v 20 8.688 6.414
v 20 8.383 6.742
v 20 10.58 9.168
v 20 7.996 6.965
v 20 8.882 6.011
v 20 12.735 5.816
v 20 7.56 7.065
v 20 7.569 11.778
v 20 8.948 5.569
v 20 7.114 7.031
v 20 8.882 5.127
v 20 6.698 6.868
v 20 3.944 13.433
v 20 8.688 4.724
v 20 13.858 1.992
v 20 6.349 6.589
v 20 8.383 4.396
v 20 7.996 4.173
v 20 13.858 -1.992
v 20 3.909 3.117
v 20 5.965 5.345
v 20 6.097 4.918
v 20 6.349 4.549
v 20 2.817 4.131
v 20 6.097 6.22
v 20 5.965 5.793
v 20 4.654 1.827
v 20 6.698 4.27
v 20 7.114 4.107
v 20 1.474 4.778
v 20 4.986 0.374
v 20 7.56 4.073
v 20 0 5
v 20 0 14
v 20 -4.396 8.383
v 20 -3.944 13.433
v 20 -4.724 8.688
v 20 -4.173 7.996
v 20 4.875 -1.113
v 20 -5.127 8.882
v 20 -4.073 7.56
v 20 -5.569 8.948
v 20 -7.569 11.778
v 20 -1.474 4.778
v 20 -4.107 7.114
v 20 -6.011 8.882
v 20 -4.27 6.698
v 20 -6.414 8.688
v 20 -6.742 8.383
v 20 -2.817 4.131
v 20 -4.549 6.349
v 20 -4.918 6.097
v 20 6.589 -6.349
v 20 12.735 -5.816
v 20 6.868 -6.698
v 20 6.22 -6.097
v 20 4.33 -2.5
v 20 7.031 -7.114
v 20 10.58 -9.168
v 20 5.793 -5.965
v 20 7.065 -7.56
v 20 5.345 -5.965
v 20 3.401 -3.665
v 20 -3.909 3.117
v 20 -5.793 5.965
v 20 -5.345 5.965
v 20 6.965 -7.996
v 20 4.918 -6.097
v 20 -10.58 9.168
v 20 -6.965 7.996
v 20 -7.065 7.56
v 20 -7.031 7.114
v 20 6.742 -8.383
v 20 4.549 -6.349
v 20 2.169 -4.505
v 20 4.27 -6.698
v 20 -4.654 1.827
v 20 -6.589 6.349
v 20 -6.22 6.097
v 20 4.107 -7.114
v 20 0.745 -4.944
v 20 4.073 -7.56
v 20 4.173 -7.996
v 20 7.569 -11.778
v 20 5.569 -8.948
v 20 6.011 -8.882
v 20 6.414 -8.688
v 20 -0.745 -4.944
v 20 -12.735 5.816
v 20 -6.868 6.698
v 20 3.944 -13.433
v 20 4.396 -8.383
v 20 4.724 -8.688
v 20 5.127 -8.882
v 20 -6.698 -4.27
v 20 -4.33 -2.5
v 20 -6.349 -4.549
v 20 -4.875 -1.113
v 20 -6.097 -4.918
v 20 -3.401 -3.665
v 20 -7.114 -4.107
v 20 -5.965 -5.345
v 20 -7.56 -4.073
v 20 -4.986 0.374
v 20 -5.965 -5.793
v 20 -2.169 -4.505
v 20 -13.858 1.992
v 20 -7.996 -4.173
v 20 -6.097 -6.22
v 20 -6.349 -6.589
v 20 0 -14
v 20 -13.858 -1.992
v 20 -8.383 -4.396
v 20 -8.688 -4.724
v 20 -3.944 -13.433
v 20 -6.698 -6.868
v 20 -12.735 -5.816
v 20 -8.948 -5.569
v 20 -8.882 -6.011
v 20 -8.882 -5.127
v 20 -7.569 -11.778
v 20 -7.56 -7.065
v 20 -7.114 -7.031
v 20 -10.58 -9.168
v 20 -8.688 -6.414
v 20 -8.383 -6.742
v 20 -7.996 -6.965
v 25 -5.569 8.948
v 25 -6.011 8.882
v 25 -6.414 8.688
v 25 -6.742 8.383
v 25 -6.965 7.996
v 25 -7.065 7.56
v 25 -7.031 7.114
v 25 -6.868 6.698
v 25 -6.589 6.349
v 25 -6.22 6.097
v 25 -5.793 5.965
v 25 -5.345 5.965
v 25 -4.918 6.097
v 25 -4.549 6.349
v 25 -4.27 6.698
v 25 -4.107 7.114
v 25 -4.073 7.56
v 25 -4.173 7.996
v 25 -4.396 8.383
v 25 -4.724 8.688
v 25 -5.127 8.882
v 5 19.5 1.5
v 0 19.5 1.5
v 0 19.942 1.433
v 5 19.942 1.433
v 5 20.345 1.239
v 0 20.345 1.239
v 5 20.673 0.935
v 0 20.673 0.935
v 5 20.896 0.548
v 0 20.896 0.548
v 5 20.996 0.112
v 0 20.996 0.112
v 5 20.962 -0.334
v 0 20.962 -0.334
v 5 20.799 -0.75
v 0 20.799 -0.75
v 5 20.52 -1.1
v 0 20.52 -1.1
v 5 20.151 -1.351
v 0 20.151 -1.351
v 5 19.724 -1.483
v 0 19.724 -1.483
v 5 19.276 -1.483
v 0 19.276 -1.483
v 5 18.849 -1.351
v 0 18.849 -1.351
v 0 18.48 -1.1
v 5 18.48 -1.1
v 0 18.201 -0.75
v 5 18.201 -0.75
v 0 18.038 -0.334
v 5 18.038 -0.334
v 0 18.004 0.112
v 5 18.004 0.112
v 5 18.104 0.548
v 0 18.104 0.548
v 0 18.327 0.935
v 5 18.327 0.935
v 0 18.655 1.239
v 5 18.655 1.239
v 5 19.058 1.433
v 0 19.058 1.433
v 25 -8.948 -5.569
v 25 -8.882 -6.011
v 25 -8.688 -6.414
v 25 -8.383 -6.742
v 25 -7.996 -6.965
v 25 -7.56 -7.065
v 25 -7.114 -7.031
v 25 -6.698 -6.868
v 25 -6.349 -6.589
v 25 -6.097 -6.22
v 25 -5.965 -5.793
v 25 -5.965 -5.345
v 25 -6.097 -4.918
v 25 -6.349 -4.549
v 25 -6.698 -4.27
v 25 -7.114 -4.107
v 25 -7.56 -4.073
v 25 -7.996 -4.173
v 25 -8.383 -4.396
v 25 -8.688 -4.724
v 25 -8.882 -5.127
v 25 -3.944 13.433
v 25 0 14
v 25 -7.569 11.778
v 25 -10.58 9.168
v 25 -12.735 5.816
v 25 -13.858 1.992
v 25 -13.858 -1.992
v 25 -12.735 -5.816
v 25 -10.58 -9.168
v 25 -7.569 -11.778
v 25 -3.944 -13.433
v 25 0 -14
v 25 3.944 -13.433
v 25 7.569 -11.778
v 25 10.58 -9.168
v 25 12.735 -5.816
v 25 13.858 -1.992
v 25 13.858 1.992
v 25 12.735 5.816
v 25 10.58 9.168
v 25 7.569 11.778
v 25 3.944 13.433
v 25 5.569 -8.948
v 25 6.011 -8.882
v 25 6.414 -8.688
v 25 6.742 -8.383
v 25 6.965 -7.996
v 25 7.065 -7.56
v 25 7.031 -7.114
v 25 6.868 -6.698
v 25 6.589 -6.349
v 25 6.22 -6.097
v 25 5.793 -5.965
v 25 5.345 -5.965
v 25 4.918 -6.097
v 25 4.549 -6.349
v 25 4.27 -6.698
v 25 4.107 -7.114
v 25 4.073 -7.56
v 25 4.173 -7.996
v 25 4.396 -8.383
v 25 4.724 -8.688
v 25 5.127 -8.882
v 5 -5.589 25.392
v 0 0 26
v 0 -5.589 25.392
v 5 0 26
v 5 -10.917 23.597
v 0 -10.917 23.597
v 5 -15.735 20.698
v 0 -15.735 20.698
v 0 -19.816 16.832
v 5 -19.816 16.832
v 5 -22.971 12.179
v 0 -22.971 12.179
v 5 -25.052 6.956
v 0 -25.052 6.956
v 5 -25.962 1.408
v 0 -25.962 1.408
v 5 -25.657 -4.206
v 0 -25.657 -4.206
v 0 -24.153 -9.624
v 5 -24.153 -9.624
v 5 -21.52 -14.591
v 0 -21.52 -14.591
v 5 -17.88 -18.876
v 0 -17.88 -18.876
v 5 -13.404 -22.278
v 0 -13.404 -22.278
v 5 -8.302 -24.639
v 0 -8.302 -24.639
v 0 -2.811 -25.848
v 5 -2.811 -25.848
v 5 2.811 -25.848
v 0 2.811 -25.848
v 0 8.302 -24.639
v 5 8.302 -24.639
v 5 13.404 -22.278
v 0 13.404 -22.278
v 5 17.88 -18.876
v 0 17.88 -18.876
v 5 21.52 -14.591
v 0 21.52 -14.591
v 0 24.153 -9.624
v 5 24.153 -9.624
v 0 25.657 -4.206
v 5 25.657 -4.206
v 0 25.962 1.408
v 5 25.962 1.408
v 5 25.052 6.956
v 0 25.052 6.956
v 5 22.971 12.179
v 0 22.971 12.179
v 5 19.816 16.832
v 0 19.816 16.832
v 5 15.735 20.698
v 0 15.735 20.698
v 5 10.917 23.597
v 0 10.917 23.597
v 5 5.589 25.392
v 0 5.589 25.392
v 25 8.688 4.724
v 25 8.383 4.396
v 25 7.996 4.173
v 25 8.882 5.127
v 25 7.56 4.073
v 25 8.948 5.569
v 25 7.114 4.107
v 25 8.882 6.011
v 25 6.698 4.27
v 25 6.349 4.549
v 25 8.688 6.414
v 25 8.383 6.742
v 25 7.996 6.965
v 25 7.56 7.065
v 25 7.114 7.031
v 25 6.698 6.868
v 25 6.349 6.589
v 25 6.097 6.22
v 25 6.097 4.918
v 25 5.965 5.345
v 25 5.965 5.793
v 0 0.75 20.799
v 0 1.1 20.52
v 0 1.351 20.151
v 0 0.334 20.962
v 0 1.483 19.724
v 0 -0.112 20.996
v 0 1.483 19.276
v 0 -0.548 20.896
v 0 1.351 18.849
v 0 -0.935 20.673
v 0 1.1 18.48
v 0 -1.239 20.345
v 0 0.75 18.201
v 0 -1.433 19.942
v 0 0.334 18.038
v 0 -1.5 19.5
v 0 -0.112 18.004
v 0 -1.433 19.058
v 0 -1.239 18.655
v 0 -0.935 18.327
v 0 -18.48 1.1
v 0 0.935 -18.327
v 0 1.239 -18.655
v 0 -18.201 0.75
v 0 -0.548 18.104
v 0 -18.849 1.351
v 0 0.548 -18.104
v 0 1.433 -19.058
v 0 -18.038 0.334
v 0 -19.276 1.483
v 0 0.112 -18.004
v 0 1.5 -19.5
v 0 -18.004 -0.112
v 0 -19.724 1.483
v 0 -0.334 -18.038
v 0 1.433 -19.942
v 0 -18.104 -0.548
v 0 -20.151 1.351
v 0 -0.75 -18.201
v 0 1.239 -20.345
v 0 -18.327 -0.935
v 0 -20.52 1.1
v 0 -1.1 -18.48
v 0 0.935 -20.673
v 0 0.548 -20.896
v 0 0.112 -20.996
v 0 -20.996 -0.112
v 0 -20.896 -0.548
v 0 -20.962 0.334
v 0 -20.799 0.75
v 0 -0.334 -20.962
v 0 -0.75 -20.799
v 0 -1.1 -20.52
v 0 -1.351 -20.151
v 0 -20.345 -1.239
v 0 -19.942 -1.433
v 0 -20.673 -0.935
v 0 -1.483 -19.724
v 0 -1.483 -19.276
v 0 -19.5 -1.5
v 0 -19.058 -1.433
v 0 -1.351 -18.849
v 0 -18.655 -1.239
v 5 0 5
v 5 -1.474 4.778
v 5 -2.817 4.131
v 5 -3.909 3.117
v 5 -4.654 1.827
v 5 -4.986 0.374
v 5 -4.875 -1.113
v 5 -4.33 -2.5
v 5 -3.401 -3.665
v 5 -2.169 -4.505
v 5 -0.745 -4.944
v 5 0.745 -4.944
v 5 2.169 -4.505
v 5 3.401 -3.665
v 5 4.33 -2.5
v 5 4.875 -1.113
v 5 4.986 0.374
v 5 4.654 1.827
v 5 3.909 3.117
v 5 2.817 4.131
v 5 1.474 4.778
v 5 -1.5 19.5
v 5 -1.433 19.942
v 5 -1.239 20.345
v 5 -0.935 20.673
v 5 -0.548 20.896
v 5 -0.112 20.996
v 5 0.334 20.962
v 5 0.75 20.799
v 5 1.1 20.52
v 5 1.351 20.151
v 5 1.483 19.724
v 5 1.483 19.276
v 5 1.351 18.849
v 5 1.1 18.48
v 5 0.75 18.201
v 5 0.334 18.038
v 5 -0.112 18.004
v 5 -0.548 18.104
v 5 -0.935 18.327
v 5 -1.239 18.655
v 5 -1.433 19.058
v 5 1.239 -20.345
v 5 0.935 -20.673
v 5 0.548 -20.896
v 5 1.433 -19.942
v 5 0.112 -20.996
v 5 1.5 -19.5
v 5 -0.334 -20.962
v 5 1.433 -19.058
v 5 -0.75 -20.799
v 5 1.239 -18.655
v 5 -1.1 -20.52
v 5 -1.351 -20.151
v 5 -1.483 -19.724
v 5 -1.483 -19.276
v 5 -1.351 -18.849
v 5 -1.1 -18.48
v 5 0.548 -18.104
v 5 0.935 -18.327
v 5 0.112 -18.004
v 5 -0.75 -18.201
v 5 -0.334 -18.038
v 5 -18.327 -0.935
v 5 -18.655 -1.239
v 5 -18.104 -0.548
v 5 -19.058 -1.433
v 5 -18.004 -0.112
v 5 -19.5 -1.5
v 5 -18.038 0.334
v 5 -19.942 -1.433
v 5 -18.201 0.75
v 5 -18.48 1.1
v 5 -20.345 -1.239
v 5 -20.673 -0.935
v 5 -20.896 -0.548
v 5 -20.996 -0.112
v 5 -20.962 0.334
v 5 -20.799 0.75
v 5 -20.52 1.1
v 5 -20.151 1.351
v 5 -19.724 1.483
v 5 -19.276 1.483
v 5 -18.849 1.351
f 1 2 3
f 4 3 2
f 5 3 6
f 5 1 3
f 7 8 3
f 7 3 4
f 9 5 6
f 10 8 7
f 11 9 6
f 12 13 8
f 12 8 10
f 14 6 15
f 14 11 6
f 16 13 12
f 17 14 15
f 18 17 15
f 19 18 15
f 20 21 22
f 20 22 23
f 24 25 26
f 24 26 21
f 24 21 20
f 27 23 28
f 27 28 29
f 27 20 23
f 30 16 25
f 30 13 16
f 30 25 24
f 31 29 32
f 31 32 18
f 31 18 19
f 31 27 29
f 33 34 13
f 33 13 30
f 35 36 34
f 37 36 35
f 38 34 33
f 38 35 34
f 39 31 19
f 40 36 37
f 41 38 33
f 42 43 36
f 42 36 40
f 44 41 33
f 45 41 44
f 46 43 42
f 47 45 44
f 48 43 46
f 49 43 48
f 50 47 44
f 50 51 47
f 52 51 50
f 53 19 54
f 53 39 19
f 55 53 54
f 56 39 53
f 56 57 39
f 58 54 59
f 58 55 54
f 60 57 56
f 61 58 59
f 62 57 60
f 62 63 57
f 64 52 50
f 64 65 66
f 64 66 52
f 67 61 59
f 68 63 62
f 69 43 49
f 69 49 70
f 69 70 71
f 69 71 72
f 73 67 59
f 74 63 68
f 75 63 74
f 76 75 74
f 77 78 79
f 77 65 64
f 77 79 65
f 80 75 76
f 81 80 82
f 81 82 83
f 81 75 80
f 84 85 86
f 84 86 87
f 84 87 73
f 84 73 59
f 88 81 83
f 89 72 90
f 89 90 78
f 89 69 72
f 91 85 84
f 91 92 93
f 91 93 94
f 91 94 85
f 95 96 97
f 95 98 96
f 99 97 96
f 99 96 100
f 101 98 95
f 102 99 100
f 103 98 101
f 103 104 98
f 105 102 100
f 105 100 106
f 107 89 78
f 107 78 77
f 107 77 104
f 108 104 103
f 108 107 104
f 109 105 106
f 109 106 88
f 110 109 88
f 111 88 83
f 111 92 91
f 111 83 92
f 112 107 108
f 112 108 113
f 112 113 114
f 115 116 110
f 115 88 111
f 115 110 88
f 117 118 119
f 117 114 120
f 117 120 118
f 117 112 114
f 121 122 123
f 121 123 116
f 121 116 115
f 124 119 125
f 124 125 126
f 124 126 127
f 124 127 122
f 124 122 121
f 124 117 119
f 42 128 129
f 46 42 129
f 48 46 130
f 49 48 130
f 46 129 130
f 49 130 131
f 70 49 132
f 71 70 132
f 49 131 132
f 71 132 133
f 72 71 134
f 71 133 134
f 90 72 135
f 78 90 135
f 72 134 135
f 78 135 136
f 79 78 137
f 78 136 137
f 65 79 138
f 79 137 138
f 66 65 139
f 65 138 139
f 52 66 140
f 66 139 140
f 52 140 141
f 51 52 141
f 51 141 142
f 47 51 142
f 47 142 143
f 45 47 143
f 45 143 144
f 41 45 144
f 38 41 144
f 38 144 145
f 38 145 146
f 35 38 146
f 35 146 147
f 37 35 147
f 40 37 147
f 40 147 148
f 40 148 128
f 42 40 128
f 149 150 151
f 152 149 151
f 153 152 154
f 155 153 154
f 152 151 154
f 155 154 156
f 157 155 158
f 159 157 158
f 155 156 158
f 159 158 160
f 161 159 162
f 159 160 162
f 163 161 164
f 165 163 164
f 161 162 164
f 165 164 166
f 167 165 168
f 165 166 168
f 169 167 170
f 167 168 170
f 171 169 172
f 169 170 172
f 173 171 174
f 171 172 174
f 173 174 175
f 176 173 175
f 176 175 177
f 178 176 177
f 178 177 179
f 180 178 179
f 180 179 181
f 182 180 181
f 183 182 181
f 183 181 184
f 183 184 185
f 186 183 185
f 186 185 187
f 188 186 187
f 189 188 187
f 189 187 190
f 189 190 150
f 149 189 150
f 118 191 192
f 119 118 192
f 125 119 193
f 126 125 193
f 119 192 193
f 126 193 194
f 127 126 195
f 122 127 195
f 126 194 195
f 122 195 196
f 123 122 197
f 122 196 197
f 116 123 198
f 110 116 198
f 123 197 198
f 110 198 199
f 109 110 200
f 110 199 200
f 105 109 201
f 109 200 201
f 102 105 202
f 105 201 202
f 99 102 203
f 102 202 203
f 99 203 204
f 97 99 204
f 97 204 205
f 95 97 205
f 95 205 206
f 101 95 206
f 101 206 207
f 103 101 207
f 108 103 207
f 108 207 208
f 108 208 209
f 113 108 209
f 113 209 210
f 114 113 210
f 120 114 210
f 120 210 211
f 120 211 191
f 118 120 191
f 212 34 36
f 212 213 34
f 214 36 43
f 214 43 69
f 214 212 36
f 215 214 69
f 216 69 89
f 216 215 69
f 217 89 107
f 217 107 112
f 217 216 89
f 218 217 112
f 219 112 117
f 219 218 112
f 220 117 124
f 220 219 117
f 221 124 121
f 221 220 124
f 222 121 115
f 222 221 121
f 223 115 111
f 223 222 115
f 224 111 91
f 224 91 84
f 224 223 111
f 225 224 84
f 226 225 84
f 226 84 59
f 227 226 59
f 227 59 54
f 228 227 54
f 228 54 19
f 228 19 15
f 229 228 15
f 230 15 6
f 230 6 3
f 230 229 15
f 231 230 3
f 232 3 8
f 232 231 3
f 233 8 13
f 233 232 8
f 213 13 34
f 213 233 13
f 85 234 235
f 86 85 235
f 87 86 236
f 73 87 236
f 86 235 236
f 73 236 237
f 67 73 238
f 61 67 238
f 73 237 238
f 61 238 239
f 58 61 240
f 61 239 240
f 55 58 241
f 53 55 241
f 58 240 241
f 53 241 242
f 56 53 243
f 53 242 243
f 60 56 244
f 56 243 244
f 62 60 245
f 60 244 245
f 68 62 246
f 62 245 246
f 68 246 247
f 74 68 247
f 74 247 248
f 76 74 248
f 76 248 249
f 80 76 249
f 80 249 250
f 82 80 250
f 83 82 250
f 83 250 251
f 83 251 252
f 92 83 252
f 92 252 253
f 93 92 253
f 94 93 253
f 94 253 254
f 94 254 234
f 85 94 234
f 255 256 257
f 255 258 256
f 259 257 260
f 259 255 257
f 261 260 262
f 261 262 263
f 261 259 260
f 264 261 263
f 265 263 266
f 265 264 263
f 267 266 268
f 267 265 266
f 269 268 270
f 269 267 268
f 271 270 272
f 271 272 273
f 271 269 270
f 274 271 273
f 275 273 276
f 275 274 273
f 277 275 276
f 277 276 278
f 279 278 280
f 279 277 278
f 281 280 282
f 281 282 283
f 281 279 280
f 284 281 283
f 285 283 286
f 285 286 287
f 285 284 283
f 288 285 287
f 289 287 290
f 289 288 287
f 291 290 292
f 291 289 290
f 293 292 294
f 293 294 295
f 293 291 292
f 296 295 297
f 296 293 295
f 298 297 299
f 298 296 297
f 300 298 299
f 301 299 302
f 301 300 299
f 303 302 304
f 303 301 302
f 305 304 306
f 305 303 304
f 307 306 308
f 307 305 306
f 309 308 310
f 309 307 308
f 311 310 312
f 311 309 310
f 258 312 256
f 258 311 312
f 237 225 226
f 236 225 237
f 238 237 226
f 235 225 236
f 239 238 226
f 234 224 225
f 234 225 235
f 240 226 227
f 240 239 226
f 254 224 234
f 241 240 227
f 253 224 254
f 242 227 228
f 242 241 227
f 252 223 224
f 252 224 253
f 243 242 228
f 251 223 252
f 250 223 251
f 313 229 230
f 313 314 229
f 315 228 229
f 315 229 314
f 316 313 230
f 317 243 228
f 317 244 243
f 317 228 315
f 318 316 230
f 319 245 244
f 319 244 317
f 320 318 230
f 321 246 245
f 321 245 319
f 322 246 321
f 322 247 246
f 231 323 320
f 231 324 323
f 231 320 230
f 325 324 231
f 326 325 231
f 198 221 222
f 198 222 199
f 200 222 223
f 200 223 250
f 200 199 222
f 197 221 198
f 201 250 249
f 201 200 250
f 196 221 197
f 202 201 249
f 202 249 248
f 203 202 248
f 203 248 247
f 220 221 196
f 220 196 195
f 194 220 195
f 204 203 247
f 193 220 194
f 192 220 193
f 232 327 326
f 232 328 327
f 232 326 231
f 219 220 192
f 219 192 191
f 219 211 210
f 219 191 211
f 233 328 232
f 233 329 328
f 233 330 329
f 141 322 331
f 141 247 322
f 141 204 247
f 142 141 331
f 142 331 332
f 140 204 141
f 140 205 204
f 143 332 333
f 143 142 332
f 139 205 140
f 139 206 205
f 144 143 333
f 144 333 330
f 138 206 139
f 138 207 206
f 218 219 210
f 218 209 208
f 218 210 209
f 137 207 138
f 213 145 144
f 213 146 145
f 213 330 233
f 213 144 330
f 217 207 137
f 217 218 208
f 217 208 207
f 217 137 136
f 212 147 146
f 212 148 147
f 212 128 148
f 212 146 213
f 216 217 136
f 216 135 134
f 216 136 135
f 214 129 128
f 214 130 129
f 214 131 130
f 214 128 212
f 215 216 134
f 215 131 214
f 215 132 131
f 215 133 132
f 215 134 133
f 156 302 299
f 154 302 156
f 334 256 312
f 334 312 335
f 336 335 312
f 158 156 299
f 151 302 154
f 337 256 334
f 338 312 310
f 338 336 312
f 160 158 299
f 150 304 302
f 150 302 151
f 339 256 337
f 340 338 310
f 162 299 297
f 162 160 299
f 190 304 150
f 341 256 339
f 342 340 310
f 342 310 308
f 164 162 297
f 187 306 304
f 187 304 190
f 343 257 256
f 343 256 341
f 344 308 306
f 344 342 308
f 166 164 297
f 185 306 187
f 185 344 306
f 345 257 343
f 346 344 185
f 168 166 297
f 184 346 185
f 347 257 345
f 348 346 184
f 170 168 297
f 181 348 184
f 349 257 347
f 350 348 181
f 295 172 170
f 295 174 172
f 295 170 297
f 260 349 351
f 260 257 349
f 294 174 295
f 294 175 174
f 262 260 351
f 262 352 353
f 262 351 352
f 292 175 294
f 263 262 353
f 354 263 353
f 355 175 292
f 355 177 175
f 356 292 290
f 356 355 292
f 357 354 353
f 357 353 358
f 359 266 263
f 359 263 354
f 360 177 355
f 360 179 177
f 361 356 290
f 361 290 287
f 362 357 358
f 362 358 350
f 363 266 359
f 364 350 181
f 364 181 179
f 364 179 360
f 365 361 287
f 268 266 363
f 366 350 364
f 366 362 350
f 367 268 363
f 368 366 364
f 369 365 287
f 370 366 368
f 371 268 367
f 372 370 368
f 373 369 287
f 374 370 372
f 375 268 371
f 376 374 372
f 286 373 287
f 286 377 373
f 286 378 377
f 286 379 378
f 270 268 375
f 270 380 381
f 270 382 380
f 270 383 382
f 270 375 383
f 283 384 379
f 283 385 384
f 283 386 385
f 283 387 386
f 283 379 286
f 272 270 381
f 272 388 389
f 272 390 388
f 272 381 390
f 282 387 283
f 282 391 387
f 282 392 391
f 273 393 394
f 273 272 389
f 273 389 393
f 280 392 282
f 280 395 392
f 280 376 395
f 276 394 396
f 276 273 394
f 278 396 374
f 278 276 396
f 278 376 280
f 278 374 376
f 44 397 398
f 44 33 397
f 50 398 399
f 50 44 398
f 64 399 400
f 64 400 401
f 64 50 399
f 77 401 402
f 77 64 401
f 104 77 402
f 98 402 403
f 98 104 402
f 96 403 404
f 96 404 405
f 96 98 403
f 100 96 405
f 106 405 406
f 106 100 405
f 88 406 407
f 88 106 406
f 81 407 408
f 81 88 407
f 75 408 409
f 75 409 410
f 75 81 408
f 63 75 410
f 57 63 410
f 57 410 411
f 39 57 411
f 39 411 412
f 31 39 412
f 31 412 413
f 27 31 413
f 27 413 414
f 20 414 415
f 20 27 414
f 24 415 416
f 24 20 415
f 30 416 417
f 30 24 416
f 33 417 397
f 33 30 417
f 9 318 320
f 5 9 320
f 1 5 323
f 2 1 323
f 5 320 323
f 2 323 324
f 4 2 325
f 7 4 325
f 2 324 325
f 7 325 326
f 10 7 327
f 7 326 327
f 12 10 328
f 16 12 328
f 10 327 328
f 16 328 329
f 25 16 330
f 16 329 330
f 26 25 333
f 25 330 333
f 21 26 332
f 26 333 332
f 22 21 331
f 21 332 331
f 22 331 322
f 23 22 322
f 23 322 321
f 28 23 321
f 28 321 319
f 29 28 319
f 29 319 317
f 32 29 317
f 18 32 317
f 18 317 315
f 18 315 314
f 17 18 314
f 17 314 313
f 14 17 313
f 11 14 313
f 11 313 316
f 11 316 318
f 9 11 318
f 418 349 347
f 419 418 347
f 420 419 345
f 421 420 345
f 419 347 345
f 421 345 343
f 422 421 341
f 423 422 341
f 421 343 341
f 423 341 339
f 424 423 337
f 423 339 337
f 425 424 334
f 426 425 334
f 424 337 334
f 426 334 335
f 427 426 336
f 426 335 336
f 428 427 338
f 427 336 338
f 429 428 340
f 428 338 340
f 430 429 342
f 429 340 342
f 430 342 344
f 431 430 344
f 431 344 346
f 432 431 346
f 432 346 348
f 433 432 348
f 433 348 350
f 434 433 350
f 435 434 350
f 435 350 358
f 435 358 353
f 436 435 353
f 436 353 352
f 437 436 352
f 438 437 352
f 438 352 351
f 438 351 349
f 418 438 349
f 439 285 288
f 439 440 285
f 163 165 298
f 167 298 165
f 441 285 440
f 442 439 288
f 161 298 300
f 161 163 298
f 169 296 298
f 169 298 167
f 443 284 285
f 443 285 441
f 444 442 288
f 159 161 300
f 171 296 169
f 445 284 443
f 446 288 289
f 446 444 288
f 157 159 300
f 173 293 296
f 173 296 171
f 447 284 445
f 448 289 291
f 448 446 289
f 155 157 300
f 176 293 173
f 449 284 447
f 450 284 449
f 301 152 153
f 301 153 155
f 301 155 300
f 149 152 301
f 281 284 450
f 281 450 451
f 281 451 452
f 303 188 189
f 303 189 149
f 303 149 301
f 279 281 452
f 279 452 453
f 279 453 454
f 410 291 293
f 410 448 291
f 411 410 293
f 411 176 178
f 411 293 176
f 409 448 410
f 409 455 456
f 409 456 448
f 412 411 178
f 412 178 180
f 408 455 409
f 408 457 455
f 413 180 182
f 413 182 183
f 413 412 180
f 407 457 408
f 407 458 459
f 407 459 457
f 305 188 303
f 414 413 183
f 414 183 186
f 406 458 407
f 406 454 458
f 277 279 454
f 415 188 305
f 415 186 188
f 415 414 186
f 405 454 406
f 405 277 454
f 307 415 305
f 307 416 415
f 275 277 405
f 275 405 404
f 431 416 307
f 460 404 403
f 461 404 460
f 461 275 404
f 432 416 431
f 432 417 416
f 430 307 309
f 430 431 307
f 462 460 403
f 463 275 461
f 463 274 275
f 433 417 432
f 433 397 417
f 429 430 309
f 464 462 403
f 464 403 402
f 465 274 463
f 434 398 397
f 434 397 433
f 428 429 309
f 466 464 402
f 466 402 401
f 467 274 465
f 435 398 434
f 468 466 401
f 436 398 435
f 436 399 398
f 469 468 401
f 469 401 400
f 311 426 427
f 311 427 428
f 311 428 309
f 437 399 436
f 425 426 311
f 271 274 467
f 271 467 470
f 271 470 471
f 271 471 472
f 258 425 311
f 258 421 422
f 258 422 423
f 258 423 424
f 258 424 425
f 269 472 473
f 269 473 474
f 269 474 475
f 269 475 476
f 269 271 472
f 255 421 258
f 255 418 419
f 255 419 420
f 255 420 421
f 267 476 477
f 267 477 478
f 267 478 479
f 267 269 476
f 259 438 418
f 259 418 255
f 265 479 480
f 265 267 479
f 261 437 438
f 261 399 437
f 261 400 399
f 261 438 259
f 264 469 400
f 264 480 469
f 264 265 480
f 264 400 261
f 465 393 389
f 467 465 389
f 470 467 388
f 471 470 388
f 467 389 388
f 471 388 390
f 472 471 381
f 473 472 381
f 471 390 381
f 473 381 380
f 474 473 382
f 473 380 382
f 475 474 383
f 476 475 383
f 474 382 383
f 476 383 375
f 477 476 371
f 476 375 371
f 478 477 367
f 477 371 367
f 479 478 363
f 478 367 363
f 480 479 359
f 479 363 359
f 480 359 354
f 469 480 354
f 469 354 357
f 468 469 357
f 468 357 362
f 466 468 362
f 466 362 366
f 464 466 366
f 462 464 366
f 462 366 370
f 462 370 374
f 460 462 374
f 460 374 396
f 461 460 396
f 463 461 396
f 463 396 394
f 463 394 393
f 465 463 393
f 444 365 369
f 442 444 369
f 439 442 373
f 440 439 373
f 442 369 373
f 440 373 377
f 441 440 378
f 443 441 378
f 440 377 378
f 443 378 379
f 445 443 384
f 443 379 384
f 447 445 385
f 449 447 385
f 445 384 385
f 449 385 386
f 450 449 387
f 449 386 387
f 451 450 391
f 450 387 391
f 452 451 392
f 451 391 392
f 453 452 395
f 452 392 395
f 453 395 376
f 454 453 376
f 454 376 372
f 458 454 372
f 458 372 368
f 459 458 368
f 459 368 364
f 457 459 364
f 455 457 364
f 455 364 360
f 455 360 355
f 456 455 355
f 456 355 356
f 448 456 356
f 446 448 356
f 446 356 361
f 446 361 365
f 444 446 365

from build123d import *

# Parameters (mm, degrees)
SKETCH_2_R               = 1.5
CUT_EXTRUDE_1_DEPTH      = 45.463468151
PATTERN_CIRCULAR_1_COUNT = 4
CUT_EXTRUDE_2_REACH      = 46.463
SKETCH_3_R               = 1.5
PATTERN_CIRCULAR_2_COUNT = 4


with BuildPart() as part:
    # Эскиз1 → Повернуть1 (revolve)
    with BuildSketch(Plane.XY):
        Polygon((0, 0), (0, 26), (5, 26), (5, 5), (20, 5), (20, 14), (25, 14), (25, 0), align=None)
    revolve(axis=Axis((0, 0, 0), (1, 0, 0)))

    # Эскиз2 → Вырез-Вытянуть1 (cut, through all)
    with BuildSketch(Plane.ZY):
        with Locations((0, 19.5)):
            Circle(SKETCH_2_R)
    cut_extrude_1 = extrude(amount=-CUT_EXTRUDE_1_DEPTH, mode=Mode.SUBTRACT)

    # Круговой массив1: Вырез-Вытянуть1 ×4 about axis
    pattern_circular_1_axis = Axis((5, 0, 0), (-1, 0, 0))
    for i in range(1, PATTERN_CIRCULAR_1_COUNT):
        add(cut_extrude_1.rotate(pattern_circular_1_axis, i * 360 / PATTERN_CIRCULAR_1_COUNT), mode=Mode.SUBTRACT)

    # Эскиз3 → Вырез-Вытянуть2 (cut, up to next)
    with BuildSketch(Plane(origin=(25, 0, 0), x_dir=(0, 0, -1), z_dir=(1, 0, 0)), mode=Mode.PRIVATE) as cut_extrude_2_sk1:
        with Locations((7.448193574, 5.569058492)):
            Circle(SKETCH_3_R)
    cut_extrude_2_tool1 = extrude(cut_extrude_2_sk1.sketch, amount=-CUT_EXTRUDE_2_REACH, mode=Mode.PRIVATE) & part.part
    cut_extrude_2 = cut_extrude_2_tool1.solids().sort_by_distance((25, 5.569058, -7.448194))[0]
    add(cut_extrude_2, mode=Mode.SUBTRACT)

    # Круговой массив2: Вырез-Вытянуть2 ×4 about axis
    pattern_circular_2_axis = Axis((5, 0, 0), (-1, 0, 0))
    for i in range(1, PATTERN_CIRCULAR_2_COUNT):
        add(cut_extrude_2.rotate(pattern_circular_2_axis, i * 360 / PATTERN_CIRCULAR_2_COUNT), mode=Mode.SUBTRACT)


solid = part.part
